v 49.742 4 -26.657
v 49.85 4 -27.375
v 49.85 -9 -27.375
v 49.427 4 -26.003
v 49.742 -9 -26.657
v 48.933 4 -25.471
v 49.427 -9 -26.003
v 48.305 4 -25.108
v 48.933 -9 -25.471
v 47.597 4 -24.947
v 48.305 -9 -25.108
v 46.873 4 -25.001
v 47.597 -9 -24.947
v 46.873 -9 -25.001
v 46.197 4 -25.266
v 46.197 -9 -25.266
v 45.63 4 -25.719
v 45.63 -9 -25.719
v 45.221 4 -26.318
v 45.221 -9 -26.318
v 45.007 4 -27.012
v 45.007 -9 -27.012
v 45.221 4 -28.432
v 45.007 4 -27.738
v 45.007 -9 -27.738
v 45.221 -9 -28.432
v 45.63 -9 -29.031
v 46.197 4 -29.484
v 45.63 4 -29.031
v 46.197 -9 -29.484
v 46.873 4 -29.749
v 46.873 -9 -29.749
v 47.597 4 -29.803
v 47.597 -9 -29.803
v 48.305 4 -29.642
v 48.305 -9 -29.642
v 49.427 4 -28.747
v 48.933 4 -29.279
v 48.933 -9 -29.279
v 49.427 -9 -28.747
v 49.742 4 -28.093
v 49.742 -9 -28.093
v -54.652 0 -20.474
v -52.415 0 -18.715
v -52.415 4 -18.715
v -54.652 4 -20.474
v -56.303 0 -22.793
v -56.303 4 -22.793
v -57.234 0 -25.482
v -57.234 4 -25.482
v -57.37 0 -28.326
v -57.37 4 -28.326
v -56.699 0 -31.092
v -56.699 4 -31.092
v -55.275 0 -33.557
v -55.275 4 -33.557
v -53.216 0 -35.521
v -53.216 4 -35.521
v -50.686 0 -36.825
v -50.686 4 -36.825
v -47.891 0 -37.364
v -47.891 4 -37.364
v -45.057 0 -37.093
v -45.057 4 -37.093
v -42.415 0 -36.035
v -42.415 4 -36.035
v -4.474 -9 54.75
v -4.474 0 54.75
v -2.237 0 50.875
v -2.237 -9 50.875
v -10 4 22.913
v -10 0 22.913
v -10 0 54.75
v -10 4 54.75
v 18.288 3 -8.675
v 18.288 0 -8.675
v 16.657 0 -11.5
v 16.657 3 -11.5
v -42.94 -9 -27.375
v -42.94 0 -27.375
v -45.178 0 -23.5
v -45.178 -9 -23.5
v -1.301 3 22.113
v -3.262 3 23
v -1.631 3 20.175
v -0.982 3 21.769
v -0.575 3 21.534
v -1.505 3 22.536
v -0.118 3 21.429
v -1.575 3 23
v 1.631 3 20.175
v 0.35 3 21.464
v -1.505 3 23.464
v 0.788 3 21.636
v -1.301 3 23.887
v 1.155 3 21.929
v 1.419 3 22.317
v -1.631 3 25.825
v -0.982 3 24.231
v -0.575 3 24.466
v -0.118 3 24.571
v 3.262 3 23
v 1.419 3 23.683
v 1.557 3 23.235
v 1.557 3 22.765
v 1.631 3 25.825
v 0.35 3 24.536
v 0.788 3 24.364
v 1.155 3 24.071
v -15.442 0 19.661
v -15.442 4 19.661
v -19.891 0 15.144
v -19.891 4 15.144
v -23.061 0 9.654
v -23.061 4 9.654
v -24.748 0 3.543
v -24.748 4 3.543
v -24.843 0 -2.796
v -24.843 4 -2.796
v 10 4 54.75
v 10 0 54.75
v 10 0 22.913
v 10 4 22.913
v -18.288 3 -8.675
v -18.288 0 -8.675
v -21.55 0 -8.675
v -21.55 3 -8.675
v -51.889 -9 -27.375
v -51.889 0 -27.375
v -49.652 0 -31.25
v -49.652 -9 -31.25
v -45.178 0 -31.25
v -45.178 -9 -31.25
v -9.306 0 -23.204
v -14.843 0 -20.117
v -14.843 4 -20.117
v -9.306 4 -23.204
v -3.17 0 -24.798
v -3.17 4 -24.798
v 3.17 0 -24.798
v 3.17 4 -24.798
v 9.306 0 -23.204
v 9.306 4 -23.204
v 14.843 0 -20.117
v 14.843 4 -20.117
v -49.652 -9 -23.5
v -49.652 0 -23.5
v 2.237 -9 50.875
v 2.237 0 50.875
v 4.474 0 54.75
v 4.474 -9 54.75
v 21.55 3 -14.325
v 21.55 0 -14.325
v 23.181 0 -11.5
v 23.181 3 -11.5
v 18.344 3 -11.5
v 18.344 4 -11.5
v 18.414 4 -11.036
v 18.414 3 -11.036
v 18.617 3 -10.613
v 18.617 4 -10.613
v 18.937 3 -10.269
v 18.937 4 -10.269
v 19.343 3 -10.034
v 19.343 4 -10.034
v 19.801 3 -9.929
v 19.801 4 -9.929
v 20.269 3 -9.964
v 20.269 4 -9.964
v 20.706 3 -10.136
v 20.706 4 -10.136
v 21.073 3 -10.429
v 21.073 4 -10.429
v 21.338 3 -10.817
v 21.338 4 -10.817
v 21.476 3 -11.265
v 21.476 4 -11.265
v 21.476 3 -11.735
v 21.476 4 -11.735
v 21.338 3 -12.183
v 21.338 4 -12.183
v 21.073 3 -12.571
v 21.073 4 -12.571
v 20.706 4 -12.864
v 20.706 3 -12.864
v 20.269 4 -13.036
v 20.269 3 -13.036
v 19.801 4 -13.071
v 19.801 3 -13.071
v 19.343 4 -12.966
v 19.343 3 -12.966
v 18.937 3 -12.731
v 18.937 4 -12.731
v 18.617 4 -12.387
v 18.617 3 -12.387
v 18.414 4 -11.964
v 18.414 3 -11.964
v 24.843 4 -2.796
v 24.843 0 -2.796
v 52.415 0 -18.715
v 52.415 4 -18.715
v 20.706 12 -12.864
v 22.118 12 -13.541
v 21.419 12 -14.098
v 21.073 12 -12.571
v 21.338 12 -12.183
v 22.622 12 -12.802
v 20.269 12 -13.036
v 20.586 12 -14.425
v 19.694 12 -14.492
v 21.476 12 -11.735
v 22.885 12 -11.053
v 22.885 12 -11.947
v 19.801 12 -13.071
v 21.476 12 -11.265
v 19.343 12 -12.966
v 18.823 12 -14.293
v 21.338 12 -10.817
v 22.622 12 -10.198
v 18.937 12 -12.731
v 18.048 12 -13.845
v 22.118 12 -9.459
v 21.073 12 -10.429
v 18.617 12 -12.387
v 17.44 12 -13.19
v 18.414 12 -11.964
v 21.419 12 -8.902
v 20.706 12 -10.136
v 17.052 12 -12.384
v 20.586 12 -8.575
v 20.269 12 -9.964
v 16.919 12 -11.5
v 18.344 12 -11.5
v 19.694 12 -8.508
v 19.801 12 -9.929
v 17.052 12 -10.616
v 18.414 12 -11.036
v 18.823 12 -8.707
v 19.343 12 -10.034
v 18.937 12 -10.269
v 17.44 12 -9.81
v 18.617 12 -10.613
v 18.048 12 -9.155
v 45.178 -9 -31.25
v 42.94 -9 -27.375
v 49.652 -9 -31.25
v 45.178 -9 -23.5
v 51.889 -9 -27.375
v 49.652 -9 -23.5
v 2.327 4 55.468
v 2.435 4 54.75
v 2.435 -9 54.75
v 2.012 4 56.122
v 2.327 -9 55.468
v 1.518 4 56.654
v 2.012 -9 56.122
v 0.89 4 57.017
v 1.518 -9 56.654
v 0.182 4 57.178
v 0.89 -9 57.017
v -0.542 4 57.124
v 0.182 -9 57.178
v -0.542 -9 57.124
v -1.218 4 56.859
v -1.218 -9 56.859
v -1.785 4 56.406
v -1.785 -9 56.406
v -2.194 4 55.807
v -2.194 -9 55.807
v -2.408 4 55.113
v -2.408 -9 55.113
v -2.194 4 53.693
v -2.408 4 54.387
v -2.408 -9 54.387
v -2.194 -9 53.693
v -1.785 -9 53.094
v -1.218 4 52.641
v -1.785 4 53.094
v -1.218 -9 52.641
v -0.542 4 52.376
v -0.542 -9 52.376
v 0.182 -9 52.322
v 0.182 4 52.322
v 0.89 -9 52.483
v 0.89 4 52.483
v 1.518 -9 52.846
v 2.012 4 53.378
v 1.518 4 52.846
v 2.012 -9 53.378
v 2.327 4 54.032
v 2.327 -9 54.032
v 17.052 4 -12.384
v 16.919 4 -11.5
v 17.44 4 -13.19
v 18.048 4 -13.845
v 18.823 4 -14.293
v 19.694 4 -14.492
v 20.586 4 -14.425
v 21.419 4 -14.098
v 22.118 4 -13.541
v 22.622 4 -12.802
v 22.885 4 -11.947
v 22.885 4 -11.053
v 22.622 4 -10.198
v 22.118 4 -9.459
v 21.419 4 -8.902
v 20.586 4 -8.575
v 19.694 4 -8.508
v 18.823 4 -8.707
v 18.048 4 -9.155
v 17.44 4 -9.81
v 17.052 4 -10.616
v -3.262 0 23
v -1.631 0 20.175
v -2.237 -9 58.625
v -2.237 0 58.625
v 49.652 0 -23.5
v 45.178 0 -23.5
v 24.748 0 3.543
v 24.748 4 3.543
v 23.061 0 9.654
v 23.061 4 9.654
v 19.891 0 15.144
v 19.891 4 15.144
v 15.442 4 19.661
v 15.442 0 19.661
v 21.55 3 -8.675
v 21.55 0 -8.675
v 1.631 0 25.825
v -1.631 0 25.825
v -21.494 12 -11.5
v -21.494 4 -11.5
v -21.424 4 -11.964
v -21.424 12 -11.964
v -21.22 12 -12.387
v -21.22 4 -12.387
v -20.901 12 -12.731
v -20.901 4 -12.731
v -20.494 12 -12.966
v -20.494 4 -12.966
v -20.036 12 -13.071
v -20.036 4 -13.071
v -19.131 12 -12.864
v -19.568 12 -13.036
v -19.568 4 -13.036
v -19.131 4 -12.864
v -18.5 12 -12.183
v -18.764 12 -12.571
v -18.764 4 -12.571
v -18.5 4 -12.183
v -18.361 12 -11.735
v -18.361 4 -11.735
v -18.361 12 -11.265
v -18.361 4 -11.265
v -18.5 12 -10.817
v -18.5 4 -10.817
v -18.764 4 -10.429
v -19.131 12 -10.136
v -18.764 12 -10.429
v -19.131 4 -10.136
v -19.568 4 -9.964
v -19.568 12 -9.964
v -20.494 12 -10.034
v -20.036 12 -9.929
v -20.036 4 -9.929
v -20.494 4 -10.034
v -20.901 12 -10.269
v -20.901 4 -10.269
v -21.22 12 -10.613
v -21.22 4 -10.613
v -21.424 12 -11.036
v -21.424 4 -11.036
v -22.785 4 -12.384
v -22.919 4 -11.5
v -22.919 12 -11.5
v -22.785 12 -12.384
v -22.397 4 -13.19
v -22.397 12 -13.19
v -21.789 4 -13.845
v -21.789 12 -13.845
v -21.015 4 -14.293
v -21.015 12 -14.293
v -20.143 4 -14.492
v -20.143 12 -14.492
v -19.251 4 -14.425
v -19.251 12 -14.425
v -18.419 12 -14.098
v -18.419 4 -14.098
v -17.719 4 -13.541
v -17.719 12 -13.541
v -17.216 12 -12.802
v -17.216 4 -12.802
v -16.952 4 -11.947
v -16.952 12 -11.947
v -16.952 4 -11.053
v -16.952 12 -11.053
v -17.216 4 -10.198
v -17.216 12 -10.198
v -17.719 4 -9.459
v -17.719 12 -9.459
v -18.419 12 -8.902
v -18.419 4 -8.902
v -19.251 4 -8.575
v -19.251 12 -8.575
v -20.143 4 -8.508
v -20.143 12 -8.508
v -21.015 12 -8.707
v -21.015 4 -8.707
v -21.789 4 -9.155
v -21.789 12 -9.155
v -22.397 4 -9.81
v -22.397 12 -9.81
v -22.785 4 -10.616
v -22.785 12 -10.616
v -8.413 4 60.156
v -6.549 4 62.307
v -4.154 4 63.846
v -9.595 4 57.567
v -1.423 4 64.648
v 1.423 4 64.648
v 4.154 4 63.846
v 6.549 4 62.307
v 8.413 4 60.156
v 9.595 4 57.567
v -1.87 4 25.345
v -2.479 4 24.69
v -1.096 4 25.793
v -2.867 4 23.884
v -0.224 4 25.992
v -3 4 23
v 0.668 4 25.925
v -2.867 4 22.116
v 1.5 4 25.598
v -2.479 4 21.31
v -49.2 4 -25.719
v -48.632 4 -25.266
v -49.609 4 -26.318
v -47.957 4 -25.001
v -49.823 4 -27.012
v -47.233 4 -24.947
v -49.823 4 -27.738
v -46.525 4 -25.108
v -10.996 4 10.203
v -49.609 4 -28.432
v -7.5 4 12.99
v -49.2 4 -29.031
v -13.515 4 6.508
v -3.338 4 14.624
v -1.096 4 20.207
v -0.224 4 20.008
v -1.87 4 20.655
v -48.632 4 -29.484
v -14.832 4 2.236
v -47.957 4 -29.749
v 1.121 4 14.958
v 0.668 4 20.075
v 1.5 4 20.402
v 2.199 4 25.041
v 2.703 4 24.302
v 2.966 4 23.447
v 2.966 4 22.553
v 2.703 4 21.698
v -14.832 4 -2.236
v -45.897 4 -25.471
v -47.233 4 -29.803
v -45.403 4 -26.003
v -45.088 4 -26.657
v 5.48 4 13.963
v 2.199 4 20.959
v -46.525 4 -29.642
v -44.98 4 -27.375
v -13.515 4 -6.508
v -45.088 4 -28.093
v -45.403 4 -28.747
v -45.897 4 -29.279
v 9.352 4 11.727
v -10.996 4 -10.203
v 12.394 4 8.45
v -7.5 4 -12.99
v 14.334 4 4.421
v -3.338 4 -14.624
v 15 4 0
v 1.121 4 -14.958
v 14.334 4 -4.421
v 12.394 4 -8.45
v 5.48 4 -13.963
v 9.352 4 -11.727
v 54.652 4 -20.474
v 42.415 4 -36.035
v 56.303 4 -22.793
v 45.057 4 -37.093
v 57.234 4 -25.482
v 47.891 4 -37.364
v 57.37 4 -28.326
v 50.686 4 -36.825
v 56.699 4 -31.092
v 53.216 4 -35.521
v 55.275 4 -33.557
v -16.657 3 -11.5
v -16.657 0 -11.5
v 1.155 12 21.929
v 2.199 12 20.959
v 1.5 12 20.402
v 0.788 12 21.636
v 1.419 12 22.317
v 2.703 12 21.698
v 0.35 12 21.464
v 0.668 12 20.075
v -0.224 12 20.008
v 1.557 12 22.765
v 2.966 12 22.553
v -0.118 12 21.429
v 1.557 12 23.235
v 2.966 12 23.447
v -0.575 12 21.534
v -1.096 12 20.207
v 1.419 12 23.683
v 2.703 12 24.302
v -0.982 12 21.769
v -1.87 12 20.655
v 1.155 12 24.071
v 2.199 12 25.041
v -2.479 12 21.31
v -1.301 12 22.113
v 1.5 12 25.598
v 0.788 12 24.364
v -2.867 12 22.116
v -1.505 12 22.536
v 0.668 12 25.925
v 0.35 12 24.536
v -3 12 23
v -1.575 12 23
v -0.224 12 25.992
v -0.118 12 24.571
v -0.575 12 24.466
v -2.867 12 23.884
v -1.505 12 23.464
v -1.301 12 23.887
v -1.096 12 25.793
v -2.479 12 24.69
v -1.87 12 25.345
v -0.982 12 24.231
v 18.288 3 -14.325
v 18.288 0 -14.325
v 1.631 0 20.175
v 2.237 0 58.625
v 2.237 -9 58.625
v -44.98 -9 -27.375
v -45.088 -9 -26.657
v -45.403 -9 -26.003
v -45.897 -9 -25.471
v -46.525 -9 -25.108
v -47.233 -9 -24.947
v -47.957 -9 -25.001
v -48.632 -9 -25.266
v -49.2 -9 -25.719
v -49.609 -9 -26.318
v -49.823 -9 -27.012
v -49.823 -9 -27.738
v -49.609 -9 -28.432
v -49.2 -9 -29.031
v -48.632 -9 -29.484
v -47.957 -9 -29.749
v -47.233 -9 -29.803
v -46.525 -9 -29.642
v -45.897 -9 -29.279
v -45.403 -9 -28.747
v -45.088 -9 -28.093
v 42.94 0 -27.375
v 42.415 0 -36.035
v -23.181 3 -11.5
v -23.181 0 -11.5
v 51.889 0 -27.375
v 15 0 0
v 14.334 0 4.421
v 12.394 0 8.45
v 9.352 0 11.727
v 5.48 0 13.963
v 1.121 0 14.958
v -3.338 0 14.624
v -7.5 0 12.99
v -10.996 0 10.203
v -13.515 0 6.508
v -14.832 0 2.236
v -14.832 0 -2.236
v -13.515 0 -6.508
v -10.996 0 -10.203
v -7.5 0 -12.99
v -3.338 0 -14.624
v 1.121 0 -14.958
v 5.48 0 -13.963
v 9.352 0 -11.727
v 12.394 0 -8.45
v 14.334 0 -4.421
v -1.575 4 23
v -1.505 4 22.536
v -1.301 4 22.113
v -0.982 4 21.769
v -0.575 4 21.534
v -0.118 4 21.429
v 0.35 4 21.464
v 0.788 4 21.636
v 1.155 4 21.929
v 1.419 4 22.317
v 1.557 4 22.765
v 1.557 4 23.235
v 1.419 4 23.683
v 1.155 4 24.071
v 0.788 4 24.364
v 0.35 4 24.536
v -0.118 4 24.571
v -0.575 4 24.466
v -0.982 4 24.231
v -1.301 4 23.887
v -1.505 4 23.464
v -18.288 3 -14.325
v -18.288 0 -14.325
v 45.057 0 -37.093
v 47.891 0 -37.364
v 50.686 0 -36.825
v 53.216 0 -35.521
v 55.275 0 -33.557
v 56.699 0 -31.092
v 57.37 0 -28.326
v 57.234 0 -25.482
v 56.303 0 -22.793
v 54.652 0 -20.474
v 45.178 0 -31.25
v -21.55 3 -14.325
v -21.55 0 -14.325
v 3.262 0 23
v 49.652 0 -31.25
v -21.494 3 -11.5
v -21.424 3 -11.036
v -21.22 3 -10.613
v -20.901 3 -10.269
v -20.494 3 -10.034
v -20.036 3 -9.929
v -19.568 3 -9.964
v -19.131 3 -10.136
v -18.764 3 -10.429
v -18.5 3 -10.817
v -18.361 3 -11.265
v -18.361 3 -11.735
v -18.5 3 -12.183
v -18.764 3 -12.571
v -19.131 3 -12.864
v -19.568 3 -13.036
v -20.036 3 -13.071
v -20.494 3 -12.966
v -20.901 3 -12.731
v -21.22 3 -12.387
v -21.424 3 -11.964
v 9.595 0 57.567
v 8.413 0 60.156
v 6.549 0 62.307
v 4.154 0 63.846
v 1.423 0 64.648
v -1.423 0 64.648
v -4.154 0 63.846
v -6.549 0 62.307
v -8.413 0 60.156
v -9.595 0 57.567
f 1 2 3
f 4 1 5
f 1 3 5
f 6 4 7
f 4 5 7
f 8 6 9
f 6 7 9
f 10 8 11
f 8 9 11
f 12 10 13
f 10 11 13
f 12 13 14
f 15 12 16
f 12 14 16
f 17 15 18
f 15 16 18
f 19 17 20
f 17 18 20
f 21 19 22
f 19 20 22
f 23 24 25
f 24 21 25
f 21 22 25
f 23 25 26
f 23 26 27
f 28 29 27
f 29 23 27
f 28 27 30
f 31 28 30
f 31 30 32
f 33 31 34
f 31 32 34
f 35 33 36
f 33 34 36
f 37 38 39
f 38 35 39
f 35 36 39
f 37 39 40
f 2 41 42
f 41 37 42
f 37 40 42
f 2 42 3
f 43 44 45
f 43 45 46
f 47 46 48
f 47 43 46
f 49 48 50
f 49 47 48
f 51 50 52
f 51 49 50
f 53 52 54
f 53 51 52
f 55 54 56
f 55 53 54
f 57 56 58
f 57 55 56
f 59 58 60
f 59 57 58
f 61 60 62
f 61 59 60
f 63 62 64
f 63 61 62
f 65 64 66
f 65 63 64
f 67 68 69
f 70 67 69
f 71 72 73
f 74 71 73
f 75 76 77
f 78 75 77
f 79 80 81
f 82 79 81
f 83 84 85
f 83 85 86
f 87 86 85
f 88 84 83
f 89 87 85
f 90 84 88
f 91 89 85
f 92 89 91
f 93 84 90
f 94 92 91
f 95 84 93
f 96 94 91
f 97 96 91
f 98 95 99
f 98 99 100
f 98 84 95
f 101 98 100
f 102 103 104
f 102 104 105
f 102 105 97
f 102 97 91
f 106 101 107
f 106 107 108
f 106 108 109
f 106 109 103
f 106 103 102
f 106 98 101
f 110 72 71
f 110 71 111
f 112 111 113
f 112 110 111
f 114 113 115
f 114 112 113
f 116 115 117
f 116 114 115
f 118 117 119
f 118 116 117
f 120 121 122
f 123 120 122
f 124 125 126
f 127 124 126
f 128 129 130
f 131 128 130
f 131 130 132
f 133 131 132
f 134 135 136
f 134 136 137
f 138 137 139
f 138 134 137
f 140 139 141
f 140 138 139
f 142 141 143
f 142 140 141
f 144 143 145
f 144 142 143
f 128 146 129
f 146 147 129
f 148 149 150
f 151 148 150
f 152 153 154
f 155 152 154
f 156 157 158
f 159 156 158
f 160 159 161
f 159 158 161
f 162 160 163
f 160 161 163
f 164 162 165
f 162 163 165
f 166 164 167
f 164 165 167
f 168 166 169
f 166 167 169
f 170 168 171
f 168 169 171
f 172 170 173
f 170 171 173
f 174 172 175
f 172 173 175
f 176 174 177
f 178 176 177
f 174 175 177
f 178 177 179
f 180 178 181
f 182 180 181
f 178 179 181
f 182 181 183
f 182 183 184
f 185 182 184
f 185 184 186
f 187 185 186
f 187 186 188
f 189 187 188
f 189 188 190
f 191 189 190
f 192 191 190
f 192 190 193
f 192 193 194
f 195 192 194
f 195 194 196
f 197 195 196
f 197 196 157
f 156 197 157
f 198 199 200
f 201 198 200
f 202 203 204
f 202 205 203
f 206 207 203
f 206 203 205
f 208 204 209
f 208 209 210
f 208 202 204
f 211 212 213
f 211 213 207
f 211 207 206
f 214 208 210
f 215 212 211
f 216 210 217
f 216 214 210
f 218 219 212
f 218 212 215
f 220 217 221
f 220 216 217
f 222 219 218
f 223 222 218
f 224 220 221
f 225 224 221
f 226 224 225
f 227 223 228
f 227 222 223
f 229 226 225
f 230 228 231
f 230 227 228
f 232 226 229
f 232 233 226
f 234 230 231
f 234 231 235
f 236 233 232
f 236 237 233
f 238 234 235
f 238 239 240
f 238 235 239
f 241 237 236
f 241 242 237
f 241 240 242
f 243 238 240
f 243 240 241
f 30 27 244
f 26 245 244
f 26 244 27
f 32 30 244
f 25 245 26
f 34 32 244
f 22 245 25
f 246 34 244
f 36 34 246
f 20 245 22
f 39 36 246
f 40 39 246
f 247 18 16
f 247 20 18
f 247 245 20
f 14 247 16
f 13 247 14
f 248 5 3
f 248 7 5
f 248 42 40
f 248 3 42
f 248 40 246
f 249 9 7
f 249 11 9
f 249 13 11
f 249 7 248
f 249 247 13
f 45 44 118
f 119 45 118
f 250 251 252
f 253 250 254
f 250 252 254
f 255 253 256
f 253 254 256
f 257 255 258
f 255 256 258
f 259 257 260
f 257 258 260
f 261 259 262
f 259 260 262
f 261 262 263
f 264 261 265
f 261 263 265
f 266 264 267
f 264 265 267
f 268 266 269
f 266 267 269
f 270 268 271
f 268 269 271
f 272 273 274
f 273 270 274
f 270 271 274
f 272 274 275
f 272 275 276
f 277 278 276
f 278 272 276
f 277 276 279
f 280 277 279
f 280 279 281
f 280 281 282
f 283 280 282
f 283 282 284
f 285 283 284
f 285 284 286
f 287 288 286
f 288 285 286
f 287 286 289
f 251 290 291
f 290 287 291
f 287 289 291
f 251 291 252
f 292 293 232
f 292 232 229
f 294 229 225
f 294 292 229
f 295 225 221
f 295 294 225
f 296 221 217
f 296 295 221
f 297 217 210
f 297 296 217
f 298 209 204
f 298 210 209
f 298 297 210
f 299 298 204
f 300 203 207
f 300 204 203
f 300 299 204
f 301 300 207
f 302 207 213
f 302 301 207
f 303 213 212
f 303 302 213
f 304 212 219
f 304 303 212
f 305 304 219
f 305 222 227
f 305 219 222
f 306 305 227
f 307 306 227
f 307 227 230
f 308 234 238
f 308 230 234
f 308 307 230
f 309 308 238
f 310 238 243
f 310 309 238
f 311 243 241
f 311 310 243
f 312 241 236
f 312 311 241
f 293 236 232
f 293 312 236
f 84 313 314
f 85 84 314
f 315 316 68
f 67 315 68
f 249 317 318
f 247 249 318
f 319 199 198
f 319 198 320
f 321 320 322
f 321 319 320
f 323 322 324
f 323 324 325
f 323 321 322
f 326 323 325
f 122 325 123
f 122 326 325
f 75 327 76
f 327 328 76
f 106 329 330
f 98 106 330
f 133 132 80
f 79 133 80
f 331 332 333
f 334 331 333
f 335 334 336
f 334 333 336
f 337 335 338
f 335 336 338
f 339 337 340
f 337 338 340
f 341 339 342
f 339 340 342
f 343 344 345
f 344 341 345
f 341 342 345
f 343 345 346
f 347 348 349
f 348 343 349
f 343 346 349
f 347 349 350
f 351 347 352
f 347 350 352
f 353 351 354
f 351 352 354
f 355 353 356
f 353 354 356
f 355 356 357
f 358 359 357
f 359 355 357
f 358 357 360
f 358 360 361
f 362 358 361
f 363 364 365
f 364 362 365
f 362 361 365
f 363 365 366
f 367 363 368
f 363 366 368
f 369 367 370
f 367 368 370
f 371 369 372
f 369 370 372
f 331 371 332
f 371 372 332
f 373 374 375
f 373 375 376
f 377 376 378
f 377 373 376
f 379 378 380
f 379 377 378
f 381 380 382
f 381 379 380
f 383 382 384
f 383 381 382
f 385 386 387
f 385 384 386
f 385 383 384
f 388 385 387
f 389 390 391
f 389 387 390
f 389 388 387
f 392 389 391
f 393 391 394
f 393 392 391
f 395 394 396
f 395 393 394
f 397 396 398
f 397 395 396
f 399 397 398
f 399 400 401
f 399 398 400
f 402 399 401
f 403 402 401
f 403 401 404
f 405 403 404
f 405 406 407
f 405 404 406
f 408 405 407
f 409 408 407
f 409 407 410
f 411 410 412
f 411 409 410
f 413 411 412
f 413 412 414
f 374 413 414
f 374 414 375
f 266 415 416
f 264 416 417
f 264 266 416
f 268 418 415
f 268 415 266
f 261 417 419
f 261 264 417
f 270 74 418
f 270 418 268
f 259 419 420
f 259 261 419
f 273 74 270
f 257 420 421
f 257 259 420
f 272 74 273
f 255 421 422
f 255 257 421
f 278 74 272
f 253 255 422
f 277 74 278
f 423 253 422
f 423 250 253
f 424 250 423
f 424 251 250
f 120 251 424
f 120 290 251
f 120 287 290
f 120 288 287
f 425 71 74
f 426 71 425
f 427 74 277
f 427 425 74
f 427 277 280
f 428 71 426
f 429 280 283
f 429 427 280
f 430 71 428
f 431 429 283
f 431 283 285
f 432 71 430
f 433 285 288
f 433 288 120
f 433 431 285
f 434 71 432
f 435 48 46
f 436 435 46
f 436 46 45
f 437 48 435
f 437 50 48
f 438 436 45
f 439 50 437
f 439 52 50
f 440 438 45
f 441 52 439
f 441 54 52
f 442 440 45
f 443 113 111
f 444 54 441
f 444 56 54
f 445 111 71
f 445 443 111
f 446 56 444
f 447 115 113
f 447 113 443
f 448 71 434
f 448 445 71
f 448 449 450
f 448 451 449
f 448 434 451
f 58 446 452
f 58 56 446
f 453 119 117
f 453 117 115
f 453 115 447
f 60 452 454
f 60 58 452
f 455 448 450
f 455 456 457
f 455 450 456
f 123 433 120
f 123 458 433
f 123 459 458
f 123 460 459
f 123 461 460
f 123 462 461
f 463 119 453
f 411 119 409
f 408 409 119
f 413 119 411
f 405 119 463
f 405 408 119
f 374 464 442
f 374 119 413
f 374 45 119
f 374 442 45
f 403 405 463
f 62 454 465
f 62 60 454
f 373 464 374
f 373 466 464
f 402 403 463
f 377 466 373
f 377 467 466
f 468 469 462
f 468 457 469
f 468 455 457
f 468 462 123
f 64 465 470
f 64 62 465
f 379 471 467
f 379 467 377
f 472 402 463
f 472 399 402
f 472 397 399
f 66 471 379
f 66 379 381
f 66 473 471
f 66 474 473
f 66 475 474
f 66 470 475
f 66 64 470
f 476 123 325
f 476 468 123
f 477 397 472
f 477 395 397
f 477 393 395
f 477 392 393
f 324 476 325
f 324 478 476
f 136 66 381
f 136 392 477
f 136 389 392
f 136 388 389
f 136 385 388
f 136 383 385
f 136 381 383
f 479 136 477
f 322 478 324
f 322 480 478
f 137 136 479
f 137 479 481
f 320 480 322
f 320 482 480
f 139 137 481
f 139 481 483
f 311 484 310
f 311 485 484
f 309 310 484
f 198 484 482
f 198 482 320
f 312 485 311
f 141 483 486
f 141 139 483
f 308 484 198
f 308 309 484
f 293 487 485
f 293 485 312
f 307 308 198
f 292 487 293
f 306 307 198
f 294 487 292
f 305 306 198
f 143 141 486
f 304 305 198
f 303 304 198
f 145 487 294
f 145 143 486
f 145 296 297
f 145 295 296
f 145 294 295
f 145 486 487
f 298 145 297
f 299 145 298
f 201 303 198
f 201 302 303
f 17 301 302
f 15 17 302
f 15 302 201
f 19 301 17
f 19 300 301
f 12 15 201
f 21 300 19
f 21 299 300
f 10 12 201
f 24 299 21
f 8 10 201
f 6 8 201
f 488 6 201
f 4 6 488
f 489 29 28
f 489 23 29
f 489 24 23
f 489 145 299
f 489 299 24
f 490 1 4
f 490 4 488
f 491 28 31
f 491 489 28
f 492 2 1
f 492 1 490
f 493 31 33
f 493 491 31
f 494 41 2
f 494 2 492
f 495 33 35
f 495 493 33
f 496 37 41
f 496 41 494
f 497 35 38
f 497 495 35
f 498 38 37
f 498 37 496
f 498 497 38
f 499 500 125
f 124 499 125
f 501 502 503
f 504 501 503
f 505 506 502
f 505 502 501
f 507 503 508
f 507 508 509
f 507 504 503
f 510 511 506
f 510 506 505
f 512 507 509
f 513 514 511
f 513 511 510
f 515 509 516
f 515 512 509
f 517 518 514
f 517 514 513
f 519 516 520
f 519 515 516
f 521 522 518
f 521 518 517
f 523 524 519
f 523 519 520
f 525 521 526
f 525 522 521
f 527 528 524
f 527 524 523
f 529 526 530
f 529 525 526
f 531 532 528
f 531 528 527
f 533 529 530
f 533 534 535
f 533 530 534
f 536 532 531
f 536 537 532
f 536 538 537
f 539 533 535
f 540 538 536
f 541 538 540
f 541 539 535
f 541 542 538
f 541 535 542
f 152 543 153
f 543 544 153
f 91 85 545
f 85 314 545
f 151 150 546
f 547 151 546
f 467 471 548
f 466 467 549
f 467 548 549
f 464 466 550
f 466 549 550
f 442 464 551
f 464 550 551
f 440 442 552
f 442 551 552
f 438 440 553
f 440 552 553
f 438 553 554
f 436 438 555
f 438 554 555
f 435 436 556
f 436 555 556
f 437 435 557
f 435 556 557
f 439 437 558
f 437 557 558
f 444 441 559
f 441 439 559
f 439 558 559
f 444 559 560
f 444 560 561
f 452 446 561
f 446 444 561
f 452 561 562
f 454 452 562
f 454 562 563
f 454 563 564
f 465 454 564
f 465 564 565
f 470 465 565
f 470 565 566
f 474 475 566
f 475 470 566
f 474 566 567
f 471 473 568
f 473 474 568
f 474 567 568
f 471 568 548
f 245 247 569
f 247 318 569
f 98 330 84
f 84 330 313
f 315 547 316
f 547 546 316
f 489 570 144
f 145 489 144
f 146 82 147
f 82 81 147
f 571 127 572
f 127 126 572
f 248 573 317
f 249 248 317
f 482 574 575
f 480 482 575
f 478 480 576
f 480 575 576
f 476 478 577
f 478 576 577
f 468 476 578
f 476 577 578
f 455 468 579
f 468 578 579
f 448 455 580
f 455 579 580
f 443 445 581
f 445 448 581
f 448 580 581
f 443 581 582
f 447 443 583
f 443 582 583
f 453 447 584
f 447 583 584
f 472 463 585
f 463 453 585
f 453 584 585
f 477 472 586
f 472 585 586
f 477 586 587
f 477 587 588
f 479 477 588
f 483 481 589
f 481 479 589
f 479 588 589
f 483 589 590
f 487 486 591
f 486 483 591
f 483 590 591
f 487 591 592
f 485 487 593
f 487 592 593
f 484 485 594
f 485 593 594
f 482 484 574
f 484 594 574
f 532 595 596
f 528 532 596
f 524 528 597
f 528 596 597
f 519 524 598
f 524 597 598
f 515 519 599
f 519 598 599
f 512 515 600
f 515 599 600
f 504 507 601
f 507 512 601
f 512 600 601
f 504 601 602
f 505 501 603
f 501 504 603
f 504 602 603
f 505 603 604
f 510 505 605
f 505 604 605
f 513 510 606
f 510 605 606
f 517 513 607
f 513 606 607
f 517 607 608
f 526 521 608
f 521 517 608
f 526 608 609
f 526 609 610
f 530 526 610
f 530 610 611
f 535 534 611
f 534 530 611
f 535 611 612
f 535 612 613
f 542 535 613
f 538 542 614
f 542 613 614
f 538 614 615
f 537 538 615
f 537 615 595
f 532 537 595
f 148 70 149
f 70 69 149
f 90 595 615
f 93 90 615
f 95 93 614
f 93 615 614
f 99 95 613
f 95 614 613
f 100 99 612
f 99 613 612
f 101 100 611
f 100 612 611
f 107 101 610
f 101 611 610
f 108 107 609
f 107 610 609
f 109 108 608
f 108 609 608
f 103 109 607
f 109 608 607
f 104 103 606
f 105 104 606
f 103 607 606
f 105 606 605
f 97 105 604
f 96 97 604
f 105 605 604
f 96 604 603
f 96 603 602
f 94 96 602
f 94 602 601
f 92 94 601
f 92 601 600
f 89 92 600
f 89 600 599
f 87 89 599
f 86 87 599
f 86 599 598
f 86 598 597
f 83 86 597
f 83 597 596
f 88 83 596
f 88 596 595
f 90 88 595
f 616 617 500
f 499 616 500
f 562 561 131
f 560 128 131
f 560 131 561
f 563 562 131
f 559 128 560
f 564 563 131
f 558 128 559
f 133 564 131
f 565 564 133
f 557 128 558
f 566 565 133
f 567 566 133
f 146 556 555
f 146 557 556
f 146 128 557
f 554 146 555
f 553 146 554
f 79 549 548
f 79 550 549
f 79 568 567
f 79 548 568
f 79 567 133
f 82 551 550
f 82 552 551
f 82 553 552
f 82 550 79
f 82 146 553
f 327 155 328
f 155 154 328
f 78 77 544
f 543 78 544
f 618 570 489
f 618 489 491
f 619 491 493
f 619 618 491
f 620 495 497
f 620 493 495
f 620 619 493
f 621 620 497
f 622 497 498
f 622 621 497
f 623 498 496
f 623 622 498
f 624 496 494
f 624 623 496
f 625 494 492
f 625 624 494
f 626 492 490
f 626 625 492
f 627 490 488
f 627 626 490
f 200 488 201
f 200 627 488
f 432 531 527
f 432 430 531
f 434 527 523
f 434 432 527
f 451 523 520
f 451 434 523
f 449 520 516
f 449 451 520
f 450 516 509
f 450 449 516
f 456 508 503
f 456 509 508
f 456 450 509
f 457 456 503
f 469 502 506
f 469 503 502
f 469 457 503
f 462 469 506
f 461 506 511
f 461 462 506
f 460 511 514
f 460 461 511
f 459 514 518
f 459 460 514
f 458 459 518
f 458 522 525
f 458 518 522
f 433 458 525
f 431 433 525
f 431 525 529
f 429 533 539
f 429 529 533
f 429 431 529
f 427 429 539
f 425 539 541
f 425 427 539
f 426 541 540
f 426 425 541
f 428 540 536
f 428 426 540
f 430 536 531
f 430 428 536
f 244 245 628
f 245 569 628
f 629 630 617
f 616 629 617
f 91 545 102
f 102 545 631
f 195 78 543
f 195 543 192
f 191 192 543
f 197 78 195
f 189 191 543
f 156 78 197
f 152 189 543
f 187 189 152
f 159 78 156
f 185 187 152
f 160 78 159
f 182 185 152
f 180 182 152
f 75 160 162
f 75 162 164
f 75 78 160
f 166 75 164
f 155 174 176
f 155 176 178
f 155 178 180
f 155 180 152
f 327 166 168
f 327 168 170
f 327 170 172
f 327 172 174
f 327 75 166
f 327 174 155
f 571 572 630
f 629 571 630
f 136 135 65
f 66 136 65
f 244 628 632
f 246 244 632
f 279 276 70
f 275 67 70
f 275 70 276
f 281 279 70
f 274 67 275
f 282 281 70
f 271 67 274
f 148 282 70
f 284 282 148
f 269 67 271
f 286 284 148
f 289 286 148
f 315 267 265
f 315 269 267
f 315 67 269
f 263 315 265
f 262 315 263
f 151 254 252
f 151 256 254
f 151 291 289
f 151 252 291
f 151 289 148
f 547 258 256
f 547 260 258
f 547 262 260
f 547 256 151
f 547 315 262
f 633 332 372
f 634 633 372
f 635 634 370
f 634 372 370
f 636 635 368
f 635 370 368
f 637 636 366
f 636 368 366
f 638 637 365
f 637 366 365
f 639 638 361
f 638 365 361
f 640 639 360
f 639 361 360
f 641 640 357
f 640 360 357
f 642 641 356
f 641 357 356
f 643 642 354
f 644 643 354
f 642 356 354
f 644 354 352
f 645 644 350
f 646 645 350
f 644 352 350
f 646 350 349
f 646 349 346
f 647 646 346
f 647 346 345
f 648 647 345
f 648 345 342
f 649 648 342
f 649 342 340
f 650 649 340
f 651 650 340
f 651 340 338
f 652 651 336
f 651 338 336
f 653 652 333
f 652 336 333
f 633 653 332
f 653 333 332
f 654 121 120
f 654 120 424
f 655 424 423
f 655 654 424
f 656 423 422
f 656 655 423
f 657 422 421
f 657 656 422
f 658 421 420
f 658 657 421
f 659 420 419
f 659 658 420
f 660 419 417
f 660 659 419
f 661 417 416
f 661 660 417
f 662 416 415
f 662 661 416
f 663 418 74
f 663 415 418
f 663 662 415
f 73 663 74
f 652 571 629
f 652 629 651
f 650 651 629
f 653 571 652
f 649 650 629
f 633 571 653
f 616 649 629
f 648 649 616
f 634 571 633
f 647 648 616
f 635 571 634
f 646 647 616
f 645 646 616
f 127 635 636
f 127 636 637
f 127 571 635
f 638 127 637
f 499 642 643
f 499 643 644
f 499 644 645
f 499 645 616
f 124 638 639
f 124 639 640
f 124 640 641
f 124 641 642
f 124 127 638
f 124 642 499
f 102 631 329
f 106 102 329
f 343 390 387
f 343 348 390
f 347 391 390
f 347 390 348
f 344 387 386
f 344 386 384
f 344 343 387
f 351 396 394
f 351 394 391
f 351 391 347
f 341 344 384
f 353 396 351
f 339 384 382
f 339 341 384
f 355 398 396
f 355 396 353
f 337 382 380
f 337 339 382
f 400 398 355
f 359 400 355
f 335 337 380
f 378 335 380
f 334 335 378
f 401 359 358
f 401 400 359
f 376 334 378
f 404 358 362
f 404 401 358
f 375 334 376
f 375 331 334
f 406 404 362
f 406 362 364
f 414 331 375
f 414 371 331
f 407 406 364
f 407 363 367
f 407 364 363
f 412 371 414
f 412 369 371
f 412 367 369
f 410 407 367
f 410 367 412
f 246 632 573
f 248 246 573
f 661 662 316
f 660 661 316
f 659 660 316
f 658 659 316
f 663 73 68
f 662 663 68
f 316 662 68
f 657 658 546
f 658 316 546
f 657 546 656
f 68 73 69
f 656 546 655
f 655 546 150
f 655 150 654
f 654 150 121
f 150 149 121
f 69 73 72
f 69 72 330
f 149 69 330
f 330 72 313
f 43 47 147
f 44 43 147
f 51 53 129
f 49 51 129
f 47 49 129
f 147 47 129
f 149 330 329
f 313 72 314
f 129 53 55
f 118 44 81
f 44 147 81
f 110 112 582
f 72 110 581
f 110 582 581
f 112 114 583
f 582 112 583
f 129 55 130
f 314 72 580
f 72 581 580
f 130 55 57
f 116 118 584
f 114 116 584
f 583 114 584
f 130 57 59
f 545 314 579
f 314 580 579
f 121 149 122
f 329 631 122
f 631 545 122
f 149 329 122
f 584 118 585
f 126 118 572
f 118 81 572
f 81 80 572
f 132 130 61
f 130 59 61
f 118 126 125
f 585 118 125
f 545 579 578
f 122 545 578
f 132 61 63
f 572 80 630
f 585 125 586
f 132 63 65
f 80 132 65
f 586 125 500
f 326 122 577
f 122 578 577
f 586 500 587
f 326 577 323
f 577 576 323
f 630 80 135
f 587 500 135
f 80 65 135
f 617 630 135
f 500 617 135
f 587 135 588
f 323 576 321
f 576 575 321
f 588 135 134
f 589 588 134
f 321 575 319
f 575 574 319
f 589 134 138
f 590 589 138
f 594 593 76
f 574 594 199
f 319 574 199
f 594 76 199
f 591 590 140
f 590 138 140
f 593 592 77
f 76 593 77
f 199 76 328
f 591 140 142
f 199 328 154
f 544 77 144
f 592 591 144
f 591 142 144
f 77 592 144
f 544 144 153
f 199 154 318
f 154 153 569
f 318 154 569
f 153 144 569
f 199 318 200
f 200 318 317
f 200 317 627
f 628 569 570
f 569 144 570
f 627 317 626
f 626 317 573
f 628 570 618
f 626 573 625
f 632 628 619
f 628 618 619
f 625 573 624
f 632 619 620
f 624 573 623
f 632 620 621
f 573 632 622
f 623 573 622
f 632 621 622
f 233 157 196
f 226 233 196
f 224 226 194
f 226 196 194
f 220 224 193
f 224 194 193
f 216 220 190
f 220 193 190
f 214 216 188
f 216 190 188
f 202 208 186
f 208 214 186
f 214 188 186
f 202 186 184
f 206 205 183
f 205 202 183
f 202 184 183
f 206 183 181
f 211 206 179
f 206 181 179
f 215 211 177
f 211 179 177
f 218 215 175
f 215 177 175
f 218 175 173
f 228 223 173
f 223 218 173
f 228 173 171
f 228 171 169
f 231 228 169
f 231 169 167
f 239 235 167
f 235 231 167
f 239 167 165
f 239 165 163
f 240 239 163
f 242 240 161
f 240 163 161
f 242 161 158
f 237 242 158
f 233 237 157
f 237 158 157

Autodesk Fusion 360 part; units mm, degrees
sketch "Sketch1" plane through (0, 0, 0) normal (0, 1, 0) x (1, 0, 0)
  circle A0 centre (0, 0) radius 15
  circle A1 centre (0, 0) radius 25
  line L0 (0, 0) -> (0, -54.75) construction
  circle A2 centre (0, -54.75) radius 2.435
  line L1 (4.5611, -54.75) -> (2.2805, -50.8)
  line L2 (2.2805, -50.8) -> (-2.2805, -50.8)
  line L3 (-2.2805, -50.8) -> (-4.5611, -54.75)
  line L4 (-4.5611, -54.75) -> (-2.2805, -58.7)
  line L5 (-2.2805, -58.7) -> (2.2805, -58.7)
  line L6 (2.2805, -58.7) -> (4.5611, -54.75)
  line L7 (-10, -22.9129) -> (-10, -54.75)
  arc A3 (-10, -54.75) -> (10, -54.75) centre (0, -54.75) ccw
  line L8 (10, -54.75) -> (10, -22.9129)
  line L9 (0, 0) -> (47.4149, 27.375) construction
  line L10 (45.1344, 31.325) -> (42.8538, 27.375)
  circle A4 centre (47.4149, 27.375) radius 2.435
  line L11 (51.976, 27.375) -> (49.6954, 31.325)
  line L12 (42.8538, 27.375) -> (45.1344, 23.425)
  line L13 (49.6954, 23.425) -> (51.976, 27.375)
  line L14 (45.1344, 23.425) -> (49.6954, 23.425)
  arc A5 (52.4149, 18.7147) -> (42.4149, 36.0353) centre (47.4149, 27.375) ccw
  line L15 (49.6954, 31.325) -> (45.1344, 31.325)
  line L16 (42.4149, 36.0353) -> (14.8431, 20.1167)
  line L17 (24.8431, 2.7962) -> (52.4149, 18.7147)
  line L18 (0, 0) -> (-47.4149, 27.375) construction
  line L19 (-49.6954, 23.425) -> (-45.1344, 23.425)
  circle A6 centre (-47.4149, 27.375) radius 2.435
  line L20 (-49.6954, 31.325) -> (-51.976, 27.375)
  line L21 (-45.1344, 23.425) -> (-42.8538, 27.375)
  line L22 (-45.1344, 31.325) -> (-49.6954, 31.325)
  line L23 (-42.8538, 27.375) -> (-45.1344, 31.325)
  arc A7 (-42.4149, 36.0353) -> (-52.4149, 18.7147) centre (-47.4149, 27.375) ccw
  line L24 (-51.976, 27.375) -> (-49.6954, 23.425)
  line L25 (-52.4149, 18.7147) -> (-24.8431, 2.7962)
  line L26 (-14.8431, 20.1167) -> (-42.4149, 36.0353)
  point P0 (0, -54.75)
  point P1 (47.4149, 27.375)
  point P2 (-47.4149, 27.375)
  dimension "d1" = 30
  dimension "d2" = 50
  dimension "d3" = 7.9
  dimension "d4" = 4.87
  dimension "d5" = 50.8
  dimension "d6" = 10
  dimension "d8" = 360
extrude "Extrude1" add sketch "Sketch1" along normal blind 4 contours A1 | A1 A5 L16 L17 | A1 L7 A3 L8 | A1 A7 L25 L26 | L1 L2 L3 L4 L5 L6 | L10 L11 L12 L13 L14 L15 | L19 L20 L21 L22 L23 L24
sketch "Sketch2" plane through (0, 0, 0) normal (0, -1, 0) x (1, 0, 0)
  circle A0 centre (0, 0) radius 15
  circle A1 centre (47.4149, -27.375) radius 2.435
  circle A2 centre (0, 54.75) radius 2.435
  circle A3 centre (-47.4149, -27.375) radius 2.435
  line L0 (-42.4149, -36.0353) -> (-14.8431, -20.1167)
  arc A4 (-14.8431, -20.1167) -> (14.8431, -20.1167) centre (0, 0) ccw
  line L1 (14.8431, -20.1167) -> (42.4149, -36.0353)
  arc A5 (42.4149, -36.0353) -> (52.4149, -18.7147) centre (47.4149, -27.375) ccw
  line L2 (52.4149, -18.7147) -> (24.8431, -2.7962)
  arc A6 (24.8431, -2.7962) -> (10, 22.9129) centre (0, 0) ccw
  line L3 (10, 22.9129) -> (10, 54.75)
  arc A7 (10, 54.75) -> (-10, 54.75) centre (0, 54.75) ccw
  line L4 (-10, 54.75) -> (-10, 22.9129)
  arc A8 (-10, 22.9129) -> (-24.8431, -2.7962) centre (0, 0) ccw
  line L5 (-24.8431, -2.7962) -> (-52.4149, -18.7147)
  arc A9 (-52.4149, -18.7147) -> (-42.4149, -36.0353) centre (-47.4149, -27.375) ccw
  line L6 (2.2372, 50.875) -> (4.4745, 54.75)
  line L7 (4.4745, 54.75) -> (2.2372, 58.625)
  line L8 (2.2372, 58.625) -> (-2.2372, 58.625)
  line L9 (-2.2372, 58.625) -> (-4.4745, 54.75)
  line L10 (-4.4745, 54.75) -> (-2.2372, 50.875)
  line L11 (-2.2372, 50.875) -> (2.2372, 50.875)
  line L12 (-51.8894, -27.375) -> (-49.6521, -31.25)
  line L13 (-45.1777, -23.5) -> (-49.6521, -23.5)
  line L14 (-42.9404, -27.375) -> (-45.1777, -23.5)
  line L15 (-49.6521, -31.25) -> (-45.1777, -31.25)
  circle A10 centre (-47.4149, -27.375) radius 2.435
  line L16 (-45.1777, -31.25) -> (-42.9404, -27.375)
  line L17 (-49.6521, -23.5) -> (-51.8894, -27.375)
  line L18 (49.6521, -31.25) -> (51.8894, -27.375)
  line L19 (42.9404, -27.375) -> (45.1777, -31.25)
  line L20 (45.1777, -23.5) -> (42.9404, -27.375)
  line L21 (51.8894, -27.375) -> (49.6521, -23.5)
  circle A11 centre (47.4149, -27.375) radius 2.435
  line L22 (49.6521, -23.5) -> (45.1777, -23.5)
  line L23 (45.1777, -31.25) -> (49.6521, -31.25)
  point P0 (0, 54.75)
  point P1 (-47.4149, -27.375)
  point P2 (47.4149, -27.375)
  dimension "d11" = 7.75
  dimension "d13" = 360
extrude "Extrude2" add sketch "Sketch2" along normal blind 9 contours L6 L7 L8 L9 L10 L11 | L12 L13 L14 L15 L16 L17 | L18 L19 L20 L21 L22 L23
sketch "Sketch3" plane through (0, 4, 0) normal (0, 1, 0) x (-1, 0, 0)
  circle A0 centre (0, 0) radius 15
  circle A1 centre (-47.4149, -27.375) radius 2.435
  circle A2 centre (0, 54.75) radius 2.435
  circle A3 centre (47.4149, -27.375) radius 2.435
  line L0 (14.8431, -20.1167) -> (42.4149, -36.0353)
  arc A4 (42.4149, -36.0353) -> (52.4149, -18.7147) centre (47.4149, -27.375) ccw
  line L1 (52.4149, -18.7147) -> (24.8431, -2.7962)
  arc A5 (24.8431, -2.7962) -> (10, 22.9129) centre (0, 0) ccw
  line L2 (10, 22.9129) -> (10, 54.75)
  arc A6 (10, 54.75) -> (-10, 54.75) centre (0, 54.75) ccw
  line L3 (-10, 54.75) -> (-10, 22.9129)
  arc A7 (-10, 22.9129) -> (-24.8431, -2.7962) centre (0, 0) ccw
  line L4 (-24.8431, -2.7962) -> (-52.4149, -18.7147)
  arc A8 (-52.4149, -18.7147) -> (-42.4149, -36.0353) centre (-47.4149, -27.375) ccw
  line L5 (-42.4149, -36.0353) -> (-14.8431, -20.1167)
  arc A9 (-14.8431, -20.1167) -> (14.8431, -20.1167) centre (0, 0) ccw
  line L6 (0, 54.75) -> (0, 15) construction
  circle A10 centre (0, 23) radius 3
  circle A11 centre (0, 23) radius 1.575
  circle A12 centre (-19.9186, -11.5) radius 3
  circle A13 centre (-19.9186, -11.5) radius 1.575
  circle A14 centre (19.9186, -11.5) radius 3
  circle A15 centre (19.9186, -11.5) radius 1.575
  dimension "d16" = 8
  dimension "d17" = 6
  dimension "d18" = 3.15
  dimension "d20" = 360
extrude "Extrude3" add sketch "Sketch3" along normal blind 8 contours A10 | A12 | A14
extrude "Extrude4" cut 3 faces at (0.5191, 4, 23.8992) (-20.3985, 4, -11.9453) (20.3916, 4, -11.4183) along direction (0, 1, 0) up to surface end surface through (0, 0, 0) normal (0, -1, 0) offset 0
sketch "Sketch4" plane through (0, 0, 0) normal (0, -1, 0) x (1, 0, 0)
  circle A0 centre (-19.9186, -11.5) radius 1.575
  circle A1 centre (0, 23) radius 1.575
  circle A2 centre (19.9186, -11.5) radius 1.575
  line L0 (-2.2372, 50.875) -> (-4.4745, 54.75)
  line L1 (-4.4745, 54.75) -> (-2.2372, 58.625)
  line L2 (-2.2372, 58.625) -> (2.2372, 58.625)
  line L3 (2.2372, 58.625) -> (4.4745, 54.75)
  line L4 (4.4745, 54.75) -> (2.2372, 50.875)
  line L5 (2.2372, 50.875) -> (-2.2372, 50.875)
  line L6 (-49.6521, -23.5) -> (-45.1777, -23.5)
  line L7 (-45.1777, -23.5) -> (-42.9404, -27.375)
  line L8 (-42.9404, -27.375) -> (-45.1777, -31.25)
  line L9 (-45.1777, -31.25) -> (-49.6521, -31.25)
  line L10 (-49.6521, -31.25) -> (-51.8894, -27.375)
  line L11 (-51.8894, -27.375) -> (-49.6521, -23.5)
  line L12 (45.1777, -31.25) -> (42.9404, -27.375)
  line L13 (42.9404, -27.375) -> (45.1777, -23.5)
  line L14 (45.1777, -23.5) -> (49.6521, -23.5)
  line L15 (49.6521, -23.5) -> (51.8894, -27.375)
  line L16 (51.8894, -27.375) -> (49.6521, -31.25)
  line L17 (49.6521, -31.25) -> (45.1777, -31.25)
  circle A3 centre (0, 0) radius 15
  line L18 (-42.4149, -36.0353) -> (-14.8431, -20.1167)
  arc A4 (-14.8431, -20.1167) -> (14.8431, -20.1167) centre (0, 0) ccw
  line L19 (14.8431, -20.1167) -> (42.4149, -36.0353)
  arc A5 (42.4149, -36.0353) -> (52.4149, -18.7147) centre (47.4149, -27.375) ccw
  line L20 (52.4149, -18.7147) -> (24.8431, -2.7962)
  arc A6 (24.8431, -2.7962) -> (10, 22.9129) centre (0, 0) ccw
  line L21 (10, 22.9129) -> (10, 54.75)
  arc A7 (10, 54.75) -> (-10, 54.75) centre (0, 54.75) ccw
  line L22 (-10, 54.75) -> (-10, 22.9129)
  arc A8 (-10, 22.9129) -> (-24.8431, -2.7962) centre (0, 0) ccw
  line L23 (-24.8431, -2.7962) -> (-52.4149, -18.7147)
  arc A9 (-52.4149, -18.7147) -> (-42.4149, -36.0353) centre (-47.4149, -27.375) ccw
  line L24 (18.2876, -14.325) -> (21.5496, -14.325)
  line L25 (21.5496, -14.325) -> (23.1806, -11.5)
  line L26 (23.1806, -11.5) -> (21.5496, -8.675)
  line L27 (21.5496, -8.675) -> (18.2876, -8.675)
  line L28 (18.2876, -8.675) -> (16.6566, -11.5)
  line L29 (16.6566, -11.5) -> (18.2876, -14.325)
  line L30 (3.262, 23) -> (1.631, 25.825)
  line L31 (1.631, 20.175) -> (3.262, 23)
  line L32 (1.631, 25.825) -> (-1.631, 25.825)
  line L33 (-1.631, 25.825) -> (-3.262, 23)
  line L34 (-3.262, 23) -> (-1.631, 20.175)
  line L35 (-1.631, 20.175) -> (1.631, 20.175)
  line L36 (-21.5496, -8.675) -> (-23.1806, -11.5)
  line L37 (-18.2876, -8.675) -> (-21.5496, -8.675)
  line L38 (-23.1806, -11.5) -> (-21.5496, -14.325)
  line L39 (-21.5496, -14.325) -> (-18.2876, -14.325)
  line L40 (-18.2876, -14.325) -> (-16.6566, -11.5)
  line L41 (-16.6566, -11.5) -> (-18.2876, -8.675)
  point P0 (19.9186, -11.5)
  point P1 (0, 23)
  point P2 (-19.9186, -11.5)
  dimension "d25" = 5.65
  dimension "d27" = 360
extrude "Extrude5" cut sketch "Sketch4" against normal up to surface (3 mm away) contours L24 L25 L26 L27 L28 L29 | L30 L31 L32 L33 L34 L35 | L36 L37 L38 L39 L40 L41
